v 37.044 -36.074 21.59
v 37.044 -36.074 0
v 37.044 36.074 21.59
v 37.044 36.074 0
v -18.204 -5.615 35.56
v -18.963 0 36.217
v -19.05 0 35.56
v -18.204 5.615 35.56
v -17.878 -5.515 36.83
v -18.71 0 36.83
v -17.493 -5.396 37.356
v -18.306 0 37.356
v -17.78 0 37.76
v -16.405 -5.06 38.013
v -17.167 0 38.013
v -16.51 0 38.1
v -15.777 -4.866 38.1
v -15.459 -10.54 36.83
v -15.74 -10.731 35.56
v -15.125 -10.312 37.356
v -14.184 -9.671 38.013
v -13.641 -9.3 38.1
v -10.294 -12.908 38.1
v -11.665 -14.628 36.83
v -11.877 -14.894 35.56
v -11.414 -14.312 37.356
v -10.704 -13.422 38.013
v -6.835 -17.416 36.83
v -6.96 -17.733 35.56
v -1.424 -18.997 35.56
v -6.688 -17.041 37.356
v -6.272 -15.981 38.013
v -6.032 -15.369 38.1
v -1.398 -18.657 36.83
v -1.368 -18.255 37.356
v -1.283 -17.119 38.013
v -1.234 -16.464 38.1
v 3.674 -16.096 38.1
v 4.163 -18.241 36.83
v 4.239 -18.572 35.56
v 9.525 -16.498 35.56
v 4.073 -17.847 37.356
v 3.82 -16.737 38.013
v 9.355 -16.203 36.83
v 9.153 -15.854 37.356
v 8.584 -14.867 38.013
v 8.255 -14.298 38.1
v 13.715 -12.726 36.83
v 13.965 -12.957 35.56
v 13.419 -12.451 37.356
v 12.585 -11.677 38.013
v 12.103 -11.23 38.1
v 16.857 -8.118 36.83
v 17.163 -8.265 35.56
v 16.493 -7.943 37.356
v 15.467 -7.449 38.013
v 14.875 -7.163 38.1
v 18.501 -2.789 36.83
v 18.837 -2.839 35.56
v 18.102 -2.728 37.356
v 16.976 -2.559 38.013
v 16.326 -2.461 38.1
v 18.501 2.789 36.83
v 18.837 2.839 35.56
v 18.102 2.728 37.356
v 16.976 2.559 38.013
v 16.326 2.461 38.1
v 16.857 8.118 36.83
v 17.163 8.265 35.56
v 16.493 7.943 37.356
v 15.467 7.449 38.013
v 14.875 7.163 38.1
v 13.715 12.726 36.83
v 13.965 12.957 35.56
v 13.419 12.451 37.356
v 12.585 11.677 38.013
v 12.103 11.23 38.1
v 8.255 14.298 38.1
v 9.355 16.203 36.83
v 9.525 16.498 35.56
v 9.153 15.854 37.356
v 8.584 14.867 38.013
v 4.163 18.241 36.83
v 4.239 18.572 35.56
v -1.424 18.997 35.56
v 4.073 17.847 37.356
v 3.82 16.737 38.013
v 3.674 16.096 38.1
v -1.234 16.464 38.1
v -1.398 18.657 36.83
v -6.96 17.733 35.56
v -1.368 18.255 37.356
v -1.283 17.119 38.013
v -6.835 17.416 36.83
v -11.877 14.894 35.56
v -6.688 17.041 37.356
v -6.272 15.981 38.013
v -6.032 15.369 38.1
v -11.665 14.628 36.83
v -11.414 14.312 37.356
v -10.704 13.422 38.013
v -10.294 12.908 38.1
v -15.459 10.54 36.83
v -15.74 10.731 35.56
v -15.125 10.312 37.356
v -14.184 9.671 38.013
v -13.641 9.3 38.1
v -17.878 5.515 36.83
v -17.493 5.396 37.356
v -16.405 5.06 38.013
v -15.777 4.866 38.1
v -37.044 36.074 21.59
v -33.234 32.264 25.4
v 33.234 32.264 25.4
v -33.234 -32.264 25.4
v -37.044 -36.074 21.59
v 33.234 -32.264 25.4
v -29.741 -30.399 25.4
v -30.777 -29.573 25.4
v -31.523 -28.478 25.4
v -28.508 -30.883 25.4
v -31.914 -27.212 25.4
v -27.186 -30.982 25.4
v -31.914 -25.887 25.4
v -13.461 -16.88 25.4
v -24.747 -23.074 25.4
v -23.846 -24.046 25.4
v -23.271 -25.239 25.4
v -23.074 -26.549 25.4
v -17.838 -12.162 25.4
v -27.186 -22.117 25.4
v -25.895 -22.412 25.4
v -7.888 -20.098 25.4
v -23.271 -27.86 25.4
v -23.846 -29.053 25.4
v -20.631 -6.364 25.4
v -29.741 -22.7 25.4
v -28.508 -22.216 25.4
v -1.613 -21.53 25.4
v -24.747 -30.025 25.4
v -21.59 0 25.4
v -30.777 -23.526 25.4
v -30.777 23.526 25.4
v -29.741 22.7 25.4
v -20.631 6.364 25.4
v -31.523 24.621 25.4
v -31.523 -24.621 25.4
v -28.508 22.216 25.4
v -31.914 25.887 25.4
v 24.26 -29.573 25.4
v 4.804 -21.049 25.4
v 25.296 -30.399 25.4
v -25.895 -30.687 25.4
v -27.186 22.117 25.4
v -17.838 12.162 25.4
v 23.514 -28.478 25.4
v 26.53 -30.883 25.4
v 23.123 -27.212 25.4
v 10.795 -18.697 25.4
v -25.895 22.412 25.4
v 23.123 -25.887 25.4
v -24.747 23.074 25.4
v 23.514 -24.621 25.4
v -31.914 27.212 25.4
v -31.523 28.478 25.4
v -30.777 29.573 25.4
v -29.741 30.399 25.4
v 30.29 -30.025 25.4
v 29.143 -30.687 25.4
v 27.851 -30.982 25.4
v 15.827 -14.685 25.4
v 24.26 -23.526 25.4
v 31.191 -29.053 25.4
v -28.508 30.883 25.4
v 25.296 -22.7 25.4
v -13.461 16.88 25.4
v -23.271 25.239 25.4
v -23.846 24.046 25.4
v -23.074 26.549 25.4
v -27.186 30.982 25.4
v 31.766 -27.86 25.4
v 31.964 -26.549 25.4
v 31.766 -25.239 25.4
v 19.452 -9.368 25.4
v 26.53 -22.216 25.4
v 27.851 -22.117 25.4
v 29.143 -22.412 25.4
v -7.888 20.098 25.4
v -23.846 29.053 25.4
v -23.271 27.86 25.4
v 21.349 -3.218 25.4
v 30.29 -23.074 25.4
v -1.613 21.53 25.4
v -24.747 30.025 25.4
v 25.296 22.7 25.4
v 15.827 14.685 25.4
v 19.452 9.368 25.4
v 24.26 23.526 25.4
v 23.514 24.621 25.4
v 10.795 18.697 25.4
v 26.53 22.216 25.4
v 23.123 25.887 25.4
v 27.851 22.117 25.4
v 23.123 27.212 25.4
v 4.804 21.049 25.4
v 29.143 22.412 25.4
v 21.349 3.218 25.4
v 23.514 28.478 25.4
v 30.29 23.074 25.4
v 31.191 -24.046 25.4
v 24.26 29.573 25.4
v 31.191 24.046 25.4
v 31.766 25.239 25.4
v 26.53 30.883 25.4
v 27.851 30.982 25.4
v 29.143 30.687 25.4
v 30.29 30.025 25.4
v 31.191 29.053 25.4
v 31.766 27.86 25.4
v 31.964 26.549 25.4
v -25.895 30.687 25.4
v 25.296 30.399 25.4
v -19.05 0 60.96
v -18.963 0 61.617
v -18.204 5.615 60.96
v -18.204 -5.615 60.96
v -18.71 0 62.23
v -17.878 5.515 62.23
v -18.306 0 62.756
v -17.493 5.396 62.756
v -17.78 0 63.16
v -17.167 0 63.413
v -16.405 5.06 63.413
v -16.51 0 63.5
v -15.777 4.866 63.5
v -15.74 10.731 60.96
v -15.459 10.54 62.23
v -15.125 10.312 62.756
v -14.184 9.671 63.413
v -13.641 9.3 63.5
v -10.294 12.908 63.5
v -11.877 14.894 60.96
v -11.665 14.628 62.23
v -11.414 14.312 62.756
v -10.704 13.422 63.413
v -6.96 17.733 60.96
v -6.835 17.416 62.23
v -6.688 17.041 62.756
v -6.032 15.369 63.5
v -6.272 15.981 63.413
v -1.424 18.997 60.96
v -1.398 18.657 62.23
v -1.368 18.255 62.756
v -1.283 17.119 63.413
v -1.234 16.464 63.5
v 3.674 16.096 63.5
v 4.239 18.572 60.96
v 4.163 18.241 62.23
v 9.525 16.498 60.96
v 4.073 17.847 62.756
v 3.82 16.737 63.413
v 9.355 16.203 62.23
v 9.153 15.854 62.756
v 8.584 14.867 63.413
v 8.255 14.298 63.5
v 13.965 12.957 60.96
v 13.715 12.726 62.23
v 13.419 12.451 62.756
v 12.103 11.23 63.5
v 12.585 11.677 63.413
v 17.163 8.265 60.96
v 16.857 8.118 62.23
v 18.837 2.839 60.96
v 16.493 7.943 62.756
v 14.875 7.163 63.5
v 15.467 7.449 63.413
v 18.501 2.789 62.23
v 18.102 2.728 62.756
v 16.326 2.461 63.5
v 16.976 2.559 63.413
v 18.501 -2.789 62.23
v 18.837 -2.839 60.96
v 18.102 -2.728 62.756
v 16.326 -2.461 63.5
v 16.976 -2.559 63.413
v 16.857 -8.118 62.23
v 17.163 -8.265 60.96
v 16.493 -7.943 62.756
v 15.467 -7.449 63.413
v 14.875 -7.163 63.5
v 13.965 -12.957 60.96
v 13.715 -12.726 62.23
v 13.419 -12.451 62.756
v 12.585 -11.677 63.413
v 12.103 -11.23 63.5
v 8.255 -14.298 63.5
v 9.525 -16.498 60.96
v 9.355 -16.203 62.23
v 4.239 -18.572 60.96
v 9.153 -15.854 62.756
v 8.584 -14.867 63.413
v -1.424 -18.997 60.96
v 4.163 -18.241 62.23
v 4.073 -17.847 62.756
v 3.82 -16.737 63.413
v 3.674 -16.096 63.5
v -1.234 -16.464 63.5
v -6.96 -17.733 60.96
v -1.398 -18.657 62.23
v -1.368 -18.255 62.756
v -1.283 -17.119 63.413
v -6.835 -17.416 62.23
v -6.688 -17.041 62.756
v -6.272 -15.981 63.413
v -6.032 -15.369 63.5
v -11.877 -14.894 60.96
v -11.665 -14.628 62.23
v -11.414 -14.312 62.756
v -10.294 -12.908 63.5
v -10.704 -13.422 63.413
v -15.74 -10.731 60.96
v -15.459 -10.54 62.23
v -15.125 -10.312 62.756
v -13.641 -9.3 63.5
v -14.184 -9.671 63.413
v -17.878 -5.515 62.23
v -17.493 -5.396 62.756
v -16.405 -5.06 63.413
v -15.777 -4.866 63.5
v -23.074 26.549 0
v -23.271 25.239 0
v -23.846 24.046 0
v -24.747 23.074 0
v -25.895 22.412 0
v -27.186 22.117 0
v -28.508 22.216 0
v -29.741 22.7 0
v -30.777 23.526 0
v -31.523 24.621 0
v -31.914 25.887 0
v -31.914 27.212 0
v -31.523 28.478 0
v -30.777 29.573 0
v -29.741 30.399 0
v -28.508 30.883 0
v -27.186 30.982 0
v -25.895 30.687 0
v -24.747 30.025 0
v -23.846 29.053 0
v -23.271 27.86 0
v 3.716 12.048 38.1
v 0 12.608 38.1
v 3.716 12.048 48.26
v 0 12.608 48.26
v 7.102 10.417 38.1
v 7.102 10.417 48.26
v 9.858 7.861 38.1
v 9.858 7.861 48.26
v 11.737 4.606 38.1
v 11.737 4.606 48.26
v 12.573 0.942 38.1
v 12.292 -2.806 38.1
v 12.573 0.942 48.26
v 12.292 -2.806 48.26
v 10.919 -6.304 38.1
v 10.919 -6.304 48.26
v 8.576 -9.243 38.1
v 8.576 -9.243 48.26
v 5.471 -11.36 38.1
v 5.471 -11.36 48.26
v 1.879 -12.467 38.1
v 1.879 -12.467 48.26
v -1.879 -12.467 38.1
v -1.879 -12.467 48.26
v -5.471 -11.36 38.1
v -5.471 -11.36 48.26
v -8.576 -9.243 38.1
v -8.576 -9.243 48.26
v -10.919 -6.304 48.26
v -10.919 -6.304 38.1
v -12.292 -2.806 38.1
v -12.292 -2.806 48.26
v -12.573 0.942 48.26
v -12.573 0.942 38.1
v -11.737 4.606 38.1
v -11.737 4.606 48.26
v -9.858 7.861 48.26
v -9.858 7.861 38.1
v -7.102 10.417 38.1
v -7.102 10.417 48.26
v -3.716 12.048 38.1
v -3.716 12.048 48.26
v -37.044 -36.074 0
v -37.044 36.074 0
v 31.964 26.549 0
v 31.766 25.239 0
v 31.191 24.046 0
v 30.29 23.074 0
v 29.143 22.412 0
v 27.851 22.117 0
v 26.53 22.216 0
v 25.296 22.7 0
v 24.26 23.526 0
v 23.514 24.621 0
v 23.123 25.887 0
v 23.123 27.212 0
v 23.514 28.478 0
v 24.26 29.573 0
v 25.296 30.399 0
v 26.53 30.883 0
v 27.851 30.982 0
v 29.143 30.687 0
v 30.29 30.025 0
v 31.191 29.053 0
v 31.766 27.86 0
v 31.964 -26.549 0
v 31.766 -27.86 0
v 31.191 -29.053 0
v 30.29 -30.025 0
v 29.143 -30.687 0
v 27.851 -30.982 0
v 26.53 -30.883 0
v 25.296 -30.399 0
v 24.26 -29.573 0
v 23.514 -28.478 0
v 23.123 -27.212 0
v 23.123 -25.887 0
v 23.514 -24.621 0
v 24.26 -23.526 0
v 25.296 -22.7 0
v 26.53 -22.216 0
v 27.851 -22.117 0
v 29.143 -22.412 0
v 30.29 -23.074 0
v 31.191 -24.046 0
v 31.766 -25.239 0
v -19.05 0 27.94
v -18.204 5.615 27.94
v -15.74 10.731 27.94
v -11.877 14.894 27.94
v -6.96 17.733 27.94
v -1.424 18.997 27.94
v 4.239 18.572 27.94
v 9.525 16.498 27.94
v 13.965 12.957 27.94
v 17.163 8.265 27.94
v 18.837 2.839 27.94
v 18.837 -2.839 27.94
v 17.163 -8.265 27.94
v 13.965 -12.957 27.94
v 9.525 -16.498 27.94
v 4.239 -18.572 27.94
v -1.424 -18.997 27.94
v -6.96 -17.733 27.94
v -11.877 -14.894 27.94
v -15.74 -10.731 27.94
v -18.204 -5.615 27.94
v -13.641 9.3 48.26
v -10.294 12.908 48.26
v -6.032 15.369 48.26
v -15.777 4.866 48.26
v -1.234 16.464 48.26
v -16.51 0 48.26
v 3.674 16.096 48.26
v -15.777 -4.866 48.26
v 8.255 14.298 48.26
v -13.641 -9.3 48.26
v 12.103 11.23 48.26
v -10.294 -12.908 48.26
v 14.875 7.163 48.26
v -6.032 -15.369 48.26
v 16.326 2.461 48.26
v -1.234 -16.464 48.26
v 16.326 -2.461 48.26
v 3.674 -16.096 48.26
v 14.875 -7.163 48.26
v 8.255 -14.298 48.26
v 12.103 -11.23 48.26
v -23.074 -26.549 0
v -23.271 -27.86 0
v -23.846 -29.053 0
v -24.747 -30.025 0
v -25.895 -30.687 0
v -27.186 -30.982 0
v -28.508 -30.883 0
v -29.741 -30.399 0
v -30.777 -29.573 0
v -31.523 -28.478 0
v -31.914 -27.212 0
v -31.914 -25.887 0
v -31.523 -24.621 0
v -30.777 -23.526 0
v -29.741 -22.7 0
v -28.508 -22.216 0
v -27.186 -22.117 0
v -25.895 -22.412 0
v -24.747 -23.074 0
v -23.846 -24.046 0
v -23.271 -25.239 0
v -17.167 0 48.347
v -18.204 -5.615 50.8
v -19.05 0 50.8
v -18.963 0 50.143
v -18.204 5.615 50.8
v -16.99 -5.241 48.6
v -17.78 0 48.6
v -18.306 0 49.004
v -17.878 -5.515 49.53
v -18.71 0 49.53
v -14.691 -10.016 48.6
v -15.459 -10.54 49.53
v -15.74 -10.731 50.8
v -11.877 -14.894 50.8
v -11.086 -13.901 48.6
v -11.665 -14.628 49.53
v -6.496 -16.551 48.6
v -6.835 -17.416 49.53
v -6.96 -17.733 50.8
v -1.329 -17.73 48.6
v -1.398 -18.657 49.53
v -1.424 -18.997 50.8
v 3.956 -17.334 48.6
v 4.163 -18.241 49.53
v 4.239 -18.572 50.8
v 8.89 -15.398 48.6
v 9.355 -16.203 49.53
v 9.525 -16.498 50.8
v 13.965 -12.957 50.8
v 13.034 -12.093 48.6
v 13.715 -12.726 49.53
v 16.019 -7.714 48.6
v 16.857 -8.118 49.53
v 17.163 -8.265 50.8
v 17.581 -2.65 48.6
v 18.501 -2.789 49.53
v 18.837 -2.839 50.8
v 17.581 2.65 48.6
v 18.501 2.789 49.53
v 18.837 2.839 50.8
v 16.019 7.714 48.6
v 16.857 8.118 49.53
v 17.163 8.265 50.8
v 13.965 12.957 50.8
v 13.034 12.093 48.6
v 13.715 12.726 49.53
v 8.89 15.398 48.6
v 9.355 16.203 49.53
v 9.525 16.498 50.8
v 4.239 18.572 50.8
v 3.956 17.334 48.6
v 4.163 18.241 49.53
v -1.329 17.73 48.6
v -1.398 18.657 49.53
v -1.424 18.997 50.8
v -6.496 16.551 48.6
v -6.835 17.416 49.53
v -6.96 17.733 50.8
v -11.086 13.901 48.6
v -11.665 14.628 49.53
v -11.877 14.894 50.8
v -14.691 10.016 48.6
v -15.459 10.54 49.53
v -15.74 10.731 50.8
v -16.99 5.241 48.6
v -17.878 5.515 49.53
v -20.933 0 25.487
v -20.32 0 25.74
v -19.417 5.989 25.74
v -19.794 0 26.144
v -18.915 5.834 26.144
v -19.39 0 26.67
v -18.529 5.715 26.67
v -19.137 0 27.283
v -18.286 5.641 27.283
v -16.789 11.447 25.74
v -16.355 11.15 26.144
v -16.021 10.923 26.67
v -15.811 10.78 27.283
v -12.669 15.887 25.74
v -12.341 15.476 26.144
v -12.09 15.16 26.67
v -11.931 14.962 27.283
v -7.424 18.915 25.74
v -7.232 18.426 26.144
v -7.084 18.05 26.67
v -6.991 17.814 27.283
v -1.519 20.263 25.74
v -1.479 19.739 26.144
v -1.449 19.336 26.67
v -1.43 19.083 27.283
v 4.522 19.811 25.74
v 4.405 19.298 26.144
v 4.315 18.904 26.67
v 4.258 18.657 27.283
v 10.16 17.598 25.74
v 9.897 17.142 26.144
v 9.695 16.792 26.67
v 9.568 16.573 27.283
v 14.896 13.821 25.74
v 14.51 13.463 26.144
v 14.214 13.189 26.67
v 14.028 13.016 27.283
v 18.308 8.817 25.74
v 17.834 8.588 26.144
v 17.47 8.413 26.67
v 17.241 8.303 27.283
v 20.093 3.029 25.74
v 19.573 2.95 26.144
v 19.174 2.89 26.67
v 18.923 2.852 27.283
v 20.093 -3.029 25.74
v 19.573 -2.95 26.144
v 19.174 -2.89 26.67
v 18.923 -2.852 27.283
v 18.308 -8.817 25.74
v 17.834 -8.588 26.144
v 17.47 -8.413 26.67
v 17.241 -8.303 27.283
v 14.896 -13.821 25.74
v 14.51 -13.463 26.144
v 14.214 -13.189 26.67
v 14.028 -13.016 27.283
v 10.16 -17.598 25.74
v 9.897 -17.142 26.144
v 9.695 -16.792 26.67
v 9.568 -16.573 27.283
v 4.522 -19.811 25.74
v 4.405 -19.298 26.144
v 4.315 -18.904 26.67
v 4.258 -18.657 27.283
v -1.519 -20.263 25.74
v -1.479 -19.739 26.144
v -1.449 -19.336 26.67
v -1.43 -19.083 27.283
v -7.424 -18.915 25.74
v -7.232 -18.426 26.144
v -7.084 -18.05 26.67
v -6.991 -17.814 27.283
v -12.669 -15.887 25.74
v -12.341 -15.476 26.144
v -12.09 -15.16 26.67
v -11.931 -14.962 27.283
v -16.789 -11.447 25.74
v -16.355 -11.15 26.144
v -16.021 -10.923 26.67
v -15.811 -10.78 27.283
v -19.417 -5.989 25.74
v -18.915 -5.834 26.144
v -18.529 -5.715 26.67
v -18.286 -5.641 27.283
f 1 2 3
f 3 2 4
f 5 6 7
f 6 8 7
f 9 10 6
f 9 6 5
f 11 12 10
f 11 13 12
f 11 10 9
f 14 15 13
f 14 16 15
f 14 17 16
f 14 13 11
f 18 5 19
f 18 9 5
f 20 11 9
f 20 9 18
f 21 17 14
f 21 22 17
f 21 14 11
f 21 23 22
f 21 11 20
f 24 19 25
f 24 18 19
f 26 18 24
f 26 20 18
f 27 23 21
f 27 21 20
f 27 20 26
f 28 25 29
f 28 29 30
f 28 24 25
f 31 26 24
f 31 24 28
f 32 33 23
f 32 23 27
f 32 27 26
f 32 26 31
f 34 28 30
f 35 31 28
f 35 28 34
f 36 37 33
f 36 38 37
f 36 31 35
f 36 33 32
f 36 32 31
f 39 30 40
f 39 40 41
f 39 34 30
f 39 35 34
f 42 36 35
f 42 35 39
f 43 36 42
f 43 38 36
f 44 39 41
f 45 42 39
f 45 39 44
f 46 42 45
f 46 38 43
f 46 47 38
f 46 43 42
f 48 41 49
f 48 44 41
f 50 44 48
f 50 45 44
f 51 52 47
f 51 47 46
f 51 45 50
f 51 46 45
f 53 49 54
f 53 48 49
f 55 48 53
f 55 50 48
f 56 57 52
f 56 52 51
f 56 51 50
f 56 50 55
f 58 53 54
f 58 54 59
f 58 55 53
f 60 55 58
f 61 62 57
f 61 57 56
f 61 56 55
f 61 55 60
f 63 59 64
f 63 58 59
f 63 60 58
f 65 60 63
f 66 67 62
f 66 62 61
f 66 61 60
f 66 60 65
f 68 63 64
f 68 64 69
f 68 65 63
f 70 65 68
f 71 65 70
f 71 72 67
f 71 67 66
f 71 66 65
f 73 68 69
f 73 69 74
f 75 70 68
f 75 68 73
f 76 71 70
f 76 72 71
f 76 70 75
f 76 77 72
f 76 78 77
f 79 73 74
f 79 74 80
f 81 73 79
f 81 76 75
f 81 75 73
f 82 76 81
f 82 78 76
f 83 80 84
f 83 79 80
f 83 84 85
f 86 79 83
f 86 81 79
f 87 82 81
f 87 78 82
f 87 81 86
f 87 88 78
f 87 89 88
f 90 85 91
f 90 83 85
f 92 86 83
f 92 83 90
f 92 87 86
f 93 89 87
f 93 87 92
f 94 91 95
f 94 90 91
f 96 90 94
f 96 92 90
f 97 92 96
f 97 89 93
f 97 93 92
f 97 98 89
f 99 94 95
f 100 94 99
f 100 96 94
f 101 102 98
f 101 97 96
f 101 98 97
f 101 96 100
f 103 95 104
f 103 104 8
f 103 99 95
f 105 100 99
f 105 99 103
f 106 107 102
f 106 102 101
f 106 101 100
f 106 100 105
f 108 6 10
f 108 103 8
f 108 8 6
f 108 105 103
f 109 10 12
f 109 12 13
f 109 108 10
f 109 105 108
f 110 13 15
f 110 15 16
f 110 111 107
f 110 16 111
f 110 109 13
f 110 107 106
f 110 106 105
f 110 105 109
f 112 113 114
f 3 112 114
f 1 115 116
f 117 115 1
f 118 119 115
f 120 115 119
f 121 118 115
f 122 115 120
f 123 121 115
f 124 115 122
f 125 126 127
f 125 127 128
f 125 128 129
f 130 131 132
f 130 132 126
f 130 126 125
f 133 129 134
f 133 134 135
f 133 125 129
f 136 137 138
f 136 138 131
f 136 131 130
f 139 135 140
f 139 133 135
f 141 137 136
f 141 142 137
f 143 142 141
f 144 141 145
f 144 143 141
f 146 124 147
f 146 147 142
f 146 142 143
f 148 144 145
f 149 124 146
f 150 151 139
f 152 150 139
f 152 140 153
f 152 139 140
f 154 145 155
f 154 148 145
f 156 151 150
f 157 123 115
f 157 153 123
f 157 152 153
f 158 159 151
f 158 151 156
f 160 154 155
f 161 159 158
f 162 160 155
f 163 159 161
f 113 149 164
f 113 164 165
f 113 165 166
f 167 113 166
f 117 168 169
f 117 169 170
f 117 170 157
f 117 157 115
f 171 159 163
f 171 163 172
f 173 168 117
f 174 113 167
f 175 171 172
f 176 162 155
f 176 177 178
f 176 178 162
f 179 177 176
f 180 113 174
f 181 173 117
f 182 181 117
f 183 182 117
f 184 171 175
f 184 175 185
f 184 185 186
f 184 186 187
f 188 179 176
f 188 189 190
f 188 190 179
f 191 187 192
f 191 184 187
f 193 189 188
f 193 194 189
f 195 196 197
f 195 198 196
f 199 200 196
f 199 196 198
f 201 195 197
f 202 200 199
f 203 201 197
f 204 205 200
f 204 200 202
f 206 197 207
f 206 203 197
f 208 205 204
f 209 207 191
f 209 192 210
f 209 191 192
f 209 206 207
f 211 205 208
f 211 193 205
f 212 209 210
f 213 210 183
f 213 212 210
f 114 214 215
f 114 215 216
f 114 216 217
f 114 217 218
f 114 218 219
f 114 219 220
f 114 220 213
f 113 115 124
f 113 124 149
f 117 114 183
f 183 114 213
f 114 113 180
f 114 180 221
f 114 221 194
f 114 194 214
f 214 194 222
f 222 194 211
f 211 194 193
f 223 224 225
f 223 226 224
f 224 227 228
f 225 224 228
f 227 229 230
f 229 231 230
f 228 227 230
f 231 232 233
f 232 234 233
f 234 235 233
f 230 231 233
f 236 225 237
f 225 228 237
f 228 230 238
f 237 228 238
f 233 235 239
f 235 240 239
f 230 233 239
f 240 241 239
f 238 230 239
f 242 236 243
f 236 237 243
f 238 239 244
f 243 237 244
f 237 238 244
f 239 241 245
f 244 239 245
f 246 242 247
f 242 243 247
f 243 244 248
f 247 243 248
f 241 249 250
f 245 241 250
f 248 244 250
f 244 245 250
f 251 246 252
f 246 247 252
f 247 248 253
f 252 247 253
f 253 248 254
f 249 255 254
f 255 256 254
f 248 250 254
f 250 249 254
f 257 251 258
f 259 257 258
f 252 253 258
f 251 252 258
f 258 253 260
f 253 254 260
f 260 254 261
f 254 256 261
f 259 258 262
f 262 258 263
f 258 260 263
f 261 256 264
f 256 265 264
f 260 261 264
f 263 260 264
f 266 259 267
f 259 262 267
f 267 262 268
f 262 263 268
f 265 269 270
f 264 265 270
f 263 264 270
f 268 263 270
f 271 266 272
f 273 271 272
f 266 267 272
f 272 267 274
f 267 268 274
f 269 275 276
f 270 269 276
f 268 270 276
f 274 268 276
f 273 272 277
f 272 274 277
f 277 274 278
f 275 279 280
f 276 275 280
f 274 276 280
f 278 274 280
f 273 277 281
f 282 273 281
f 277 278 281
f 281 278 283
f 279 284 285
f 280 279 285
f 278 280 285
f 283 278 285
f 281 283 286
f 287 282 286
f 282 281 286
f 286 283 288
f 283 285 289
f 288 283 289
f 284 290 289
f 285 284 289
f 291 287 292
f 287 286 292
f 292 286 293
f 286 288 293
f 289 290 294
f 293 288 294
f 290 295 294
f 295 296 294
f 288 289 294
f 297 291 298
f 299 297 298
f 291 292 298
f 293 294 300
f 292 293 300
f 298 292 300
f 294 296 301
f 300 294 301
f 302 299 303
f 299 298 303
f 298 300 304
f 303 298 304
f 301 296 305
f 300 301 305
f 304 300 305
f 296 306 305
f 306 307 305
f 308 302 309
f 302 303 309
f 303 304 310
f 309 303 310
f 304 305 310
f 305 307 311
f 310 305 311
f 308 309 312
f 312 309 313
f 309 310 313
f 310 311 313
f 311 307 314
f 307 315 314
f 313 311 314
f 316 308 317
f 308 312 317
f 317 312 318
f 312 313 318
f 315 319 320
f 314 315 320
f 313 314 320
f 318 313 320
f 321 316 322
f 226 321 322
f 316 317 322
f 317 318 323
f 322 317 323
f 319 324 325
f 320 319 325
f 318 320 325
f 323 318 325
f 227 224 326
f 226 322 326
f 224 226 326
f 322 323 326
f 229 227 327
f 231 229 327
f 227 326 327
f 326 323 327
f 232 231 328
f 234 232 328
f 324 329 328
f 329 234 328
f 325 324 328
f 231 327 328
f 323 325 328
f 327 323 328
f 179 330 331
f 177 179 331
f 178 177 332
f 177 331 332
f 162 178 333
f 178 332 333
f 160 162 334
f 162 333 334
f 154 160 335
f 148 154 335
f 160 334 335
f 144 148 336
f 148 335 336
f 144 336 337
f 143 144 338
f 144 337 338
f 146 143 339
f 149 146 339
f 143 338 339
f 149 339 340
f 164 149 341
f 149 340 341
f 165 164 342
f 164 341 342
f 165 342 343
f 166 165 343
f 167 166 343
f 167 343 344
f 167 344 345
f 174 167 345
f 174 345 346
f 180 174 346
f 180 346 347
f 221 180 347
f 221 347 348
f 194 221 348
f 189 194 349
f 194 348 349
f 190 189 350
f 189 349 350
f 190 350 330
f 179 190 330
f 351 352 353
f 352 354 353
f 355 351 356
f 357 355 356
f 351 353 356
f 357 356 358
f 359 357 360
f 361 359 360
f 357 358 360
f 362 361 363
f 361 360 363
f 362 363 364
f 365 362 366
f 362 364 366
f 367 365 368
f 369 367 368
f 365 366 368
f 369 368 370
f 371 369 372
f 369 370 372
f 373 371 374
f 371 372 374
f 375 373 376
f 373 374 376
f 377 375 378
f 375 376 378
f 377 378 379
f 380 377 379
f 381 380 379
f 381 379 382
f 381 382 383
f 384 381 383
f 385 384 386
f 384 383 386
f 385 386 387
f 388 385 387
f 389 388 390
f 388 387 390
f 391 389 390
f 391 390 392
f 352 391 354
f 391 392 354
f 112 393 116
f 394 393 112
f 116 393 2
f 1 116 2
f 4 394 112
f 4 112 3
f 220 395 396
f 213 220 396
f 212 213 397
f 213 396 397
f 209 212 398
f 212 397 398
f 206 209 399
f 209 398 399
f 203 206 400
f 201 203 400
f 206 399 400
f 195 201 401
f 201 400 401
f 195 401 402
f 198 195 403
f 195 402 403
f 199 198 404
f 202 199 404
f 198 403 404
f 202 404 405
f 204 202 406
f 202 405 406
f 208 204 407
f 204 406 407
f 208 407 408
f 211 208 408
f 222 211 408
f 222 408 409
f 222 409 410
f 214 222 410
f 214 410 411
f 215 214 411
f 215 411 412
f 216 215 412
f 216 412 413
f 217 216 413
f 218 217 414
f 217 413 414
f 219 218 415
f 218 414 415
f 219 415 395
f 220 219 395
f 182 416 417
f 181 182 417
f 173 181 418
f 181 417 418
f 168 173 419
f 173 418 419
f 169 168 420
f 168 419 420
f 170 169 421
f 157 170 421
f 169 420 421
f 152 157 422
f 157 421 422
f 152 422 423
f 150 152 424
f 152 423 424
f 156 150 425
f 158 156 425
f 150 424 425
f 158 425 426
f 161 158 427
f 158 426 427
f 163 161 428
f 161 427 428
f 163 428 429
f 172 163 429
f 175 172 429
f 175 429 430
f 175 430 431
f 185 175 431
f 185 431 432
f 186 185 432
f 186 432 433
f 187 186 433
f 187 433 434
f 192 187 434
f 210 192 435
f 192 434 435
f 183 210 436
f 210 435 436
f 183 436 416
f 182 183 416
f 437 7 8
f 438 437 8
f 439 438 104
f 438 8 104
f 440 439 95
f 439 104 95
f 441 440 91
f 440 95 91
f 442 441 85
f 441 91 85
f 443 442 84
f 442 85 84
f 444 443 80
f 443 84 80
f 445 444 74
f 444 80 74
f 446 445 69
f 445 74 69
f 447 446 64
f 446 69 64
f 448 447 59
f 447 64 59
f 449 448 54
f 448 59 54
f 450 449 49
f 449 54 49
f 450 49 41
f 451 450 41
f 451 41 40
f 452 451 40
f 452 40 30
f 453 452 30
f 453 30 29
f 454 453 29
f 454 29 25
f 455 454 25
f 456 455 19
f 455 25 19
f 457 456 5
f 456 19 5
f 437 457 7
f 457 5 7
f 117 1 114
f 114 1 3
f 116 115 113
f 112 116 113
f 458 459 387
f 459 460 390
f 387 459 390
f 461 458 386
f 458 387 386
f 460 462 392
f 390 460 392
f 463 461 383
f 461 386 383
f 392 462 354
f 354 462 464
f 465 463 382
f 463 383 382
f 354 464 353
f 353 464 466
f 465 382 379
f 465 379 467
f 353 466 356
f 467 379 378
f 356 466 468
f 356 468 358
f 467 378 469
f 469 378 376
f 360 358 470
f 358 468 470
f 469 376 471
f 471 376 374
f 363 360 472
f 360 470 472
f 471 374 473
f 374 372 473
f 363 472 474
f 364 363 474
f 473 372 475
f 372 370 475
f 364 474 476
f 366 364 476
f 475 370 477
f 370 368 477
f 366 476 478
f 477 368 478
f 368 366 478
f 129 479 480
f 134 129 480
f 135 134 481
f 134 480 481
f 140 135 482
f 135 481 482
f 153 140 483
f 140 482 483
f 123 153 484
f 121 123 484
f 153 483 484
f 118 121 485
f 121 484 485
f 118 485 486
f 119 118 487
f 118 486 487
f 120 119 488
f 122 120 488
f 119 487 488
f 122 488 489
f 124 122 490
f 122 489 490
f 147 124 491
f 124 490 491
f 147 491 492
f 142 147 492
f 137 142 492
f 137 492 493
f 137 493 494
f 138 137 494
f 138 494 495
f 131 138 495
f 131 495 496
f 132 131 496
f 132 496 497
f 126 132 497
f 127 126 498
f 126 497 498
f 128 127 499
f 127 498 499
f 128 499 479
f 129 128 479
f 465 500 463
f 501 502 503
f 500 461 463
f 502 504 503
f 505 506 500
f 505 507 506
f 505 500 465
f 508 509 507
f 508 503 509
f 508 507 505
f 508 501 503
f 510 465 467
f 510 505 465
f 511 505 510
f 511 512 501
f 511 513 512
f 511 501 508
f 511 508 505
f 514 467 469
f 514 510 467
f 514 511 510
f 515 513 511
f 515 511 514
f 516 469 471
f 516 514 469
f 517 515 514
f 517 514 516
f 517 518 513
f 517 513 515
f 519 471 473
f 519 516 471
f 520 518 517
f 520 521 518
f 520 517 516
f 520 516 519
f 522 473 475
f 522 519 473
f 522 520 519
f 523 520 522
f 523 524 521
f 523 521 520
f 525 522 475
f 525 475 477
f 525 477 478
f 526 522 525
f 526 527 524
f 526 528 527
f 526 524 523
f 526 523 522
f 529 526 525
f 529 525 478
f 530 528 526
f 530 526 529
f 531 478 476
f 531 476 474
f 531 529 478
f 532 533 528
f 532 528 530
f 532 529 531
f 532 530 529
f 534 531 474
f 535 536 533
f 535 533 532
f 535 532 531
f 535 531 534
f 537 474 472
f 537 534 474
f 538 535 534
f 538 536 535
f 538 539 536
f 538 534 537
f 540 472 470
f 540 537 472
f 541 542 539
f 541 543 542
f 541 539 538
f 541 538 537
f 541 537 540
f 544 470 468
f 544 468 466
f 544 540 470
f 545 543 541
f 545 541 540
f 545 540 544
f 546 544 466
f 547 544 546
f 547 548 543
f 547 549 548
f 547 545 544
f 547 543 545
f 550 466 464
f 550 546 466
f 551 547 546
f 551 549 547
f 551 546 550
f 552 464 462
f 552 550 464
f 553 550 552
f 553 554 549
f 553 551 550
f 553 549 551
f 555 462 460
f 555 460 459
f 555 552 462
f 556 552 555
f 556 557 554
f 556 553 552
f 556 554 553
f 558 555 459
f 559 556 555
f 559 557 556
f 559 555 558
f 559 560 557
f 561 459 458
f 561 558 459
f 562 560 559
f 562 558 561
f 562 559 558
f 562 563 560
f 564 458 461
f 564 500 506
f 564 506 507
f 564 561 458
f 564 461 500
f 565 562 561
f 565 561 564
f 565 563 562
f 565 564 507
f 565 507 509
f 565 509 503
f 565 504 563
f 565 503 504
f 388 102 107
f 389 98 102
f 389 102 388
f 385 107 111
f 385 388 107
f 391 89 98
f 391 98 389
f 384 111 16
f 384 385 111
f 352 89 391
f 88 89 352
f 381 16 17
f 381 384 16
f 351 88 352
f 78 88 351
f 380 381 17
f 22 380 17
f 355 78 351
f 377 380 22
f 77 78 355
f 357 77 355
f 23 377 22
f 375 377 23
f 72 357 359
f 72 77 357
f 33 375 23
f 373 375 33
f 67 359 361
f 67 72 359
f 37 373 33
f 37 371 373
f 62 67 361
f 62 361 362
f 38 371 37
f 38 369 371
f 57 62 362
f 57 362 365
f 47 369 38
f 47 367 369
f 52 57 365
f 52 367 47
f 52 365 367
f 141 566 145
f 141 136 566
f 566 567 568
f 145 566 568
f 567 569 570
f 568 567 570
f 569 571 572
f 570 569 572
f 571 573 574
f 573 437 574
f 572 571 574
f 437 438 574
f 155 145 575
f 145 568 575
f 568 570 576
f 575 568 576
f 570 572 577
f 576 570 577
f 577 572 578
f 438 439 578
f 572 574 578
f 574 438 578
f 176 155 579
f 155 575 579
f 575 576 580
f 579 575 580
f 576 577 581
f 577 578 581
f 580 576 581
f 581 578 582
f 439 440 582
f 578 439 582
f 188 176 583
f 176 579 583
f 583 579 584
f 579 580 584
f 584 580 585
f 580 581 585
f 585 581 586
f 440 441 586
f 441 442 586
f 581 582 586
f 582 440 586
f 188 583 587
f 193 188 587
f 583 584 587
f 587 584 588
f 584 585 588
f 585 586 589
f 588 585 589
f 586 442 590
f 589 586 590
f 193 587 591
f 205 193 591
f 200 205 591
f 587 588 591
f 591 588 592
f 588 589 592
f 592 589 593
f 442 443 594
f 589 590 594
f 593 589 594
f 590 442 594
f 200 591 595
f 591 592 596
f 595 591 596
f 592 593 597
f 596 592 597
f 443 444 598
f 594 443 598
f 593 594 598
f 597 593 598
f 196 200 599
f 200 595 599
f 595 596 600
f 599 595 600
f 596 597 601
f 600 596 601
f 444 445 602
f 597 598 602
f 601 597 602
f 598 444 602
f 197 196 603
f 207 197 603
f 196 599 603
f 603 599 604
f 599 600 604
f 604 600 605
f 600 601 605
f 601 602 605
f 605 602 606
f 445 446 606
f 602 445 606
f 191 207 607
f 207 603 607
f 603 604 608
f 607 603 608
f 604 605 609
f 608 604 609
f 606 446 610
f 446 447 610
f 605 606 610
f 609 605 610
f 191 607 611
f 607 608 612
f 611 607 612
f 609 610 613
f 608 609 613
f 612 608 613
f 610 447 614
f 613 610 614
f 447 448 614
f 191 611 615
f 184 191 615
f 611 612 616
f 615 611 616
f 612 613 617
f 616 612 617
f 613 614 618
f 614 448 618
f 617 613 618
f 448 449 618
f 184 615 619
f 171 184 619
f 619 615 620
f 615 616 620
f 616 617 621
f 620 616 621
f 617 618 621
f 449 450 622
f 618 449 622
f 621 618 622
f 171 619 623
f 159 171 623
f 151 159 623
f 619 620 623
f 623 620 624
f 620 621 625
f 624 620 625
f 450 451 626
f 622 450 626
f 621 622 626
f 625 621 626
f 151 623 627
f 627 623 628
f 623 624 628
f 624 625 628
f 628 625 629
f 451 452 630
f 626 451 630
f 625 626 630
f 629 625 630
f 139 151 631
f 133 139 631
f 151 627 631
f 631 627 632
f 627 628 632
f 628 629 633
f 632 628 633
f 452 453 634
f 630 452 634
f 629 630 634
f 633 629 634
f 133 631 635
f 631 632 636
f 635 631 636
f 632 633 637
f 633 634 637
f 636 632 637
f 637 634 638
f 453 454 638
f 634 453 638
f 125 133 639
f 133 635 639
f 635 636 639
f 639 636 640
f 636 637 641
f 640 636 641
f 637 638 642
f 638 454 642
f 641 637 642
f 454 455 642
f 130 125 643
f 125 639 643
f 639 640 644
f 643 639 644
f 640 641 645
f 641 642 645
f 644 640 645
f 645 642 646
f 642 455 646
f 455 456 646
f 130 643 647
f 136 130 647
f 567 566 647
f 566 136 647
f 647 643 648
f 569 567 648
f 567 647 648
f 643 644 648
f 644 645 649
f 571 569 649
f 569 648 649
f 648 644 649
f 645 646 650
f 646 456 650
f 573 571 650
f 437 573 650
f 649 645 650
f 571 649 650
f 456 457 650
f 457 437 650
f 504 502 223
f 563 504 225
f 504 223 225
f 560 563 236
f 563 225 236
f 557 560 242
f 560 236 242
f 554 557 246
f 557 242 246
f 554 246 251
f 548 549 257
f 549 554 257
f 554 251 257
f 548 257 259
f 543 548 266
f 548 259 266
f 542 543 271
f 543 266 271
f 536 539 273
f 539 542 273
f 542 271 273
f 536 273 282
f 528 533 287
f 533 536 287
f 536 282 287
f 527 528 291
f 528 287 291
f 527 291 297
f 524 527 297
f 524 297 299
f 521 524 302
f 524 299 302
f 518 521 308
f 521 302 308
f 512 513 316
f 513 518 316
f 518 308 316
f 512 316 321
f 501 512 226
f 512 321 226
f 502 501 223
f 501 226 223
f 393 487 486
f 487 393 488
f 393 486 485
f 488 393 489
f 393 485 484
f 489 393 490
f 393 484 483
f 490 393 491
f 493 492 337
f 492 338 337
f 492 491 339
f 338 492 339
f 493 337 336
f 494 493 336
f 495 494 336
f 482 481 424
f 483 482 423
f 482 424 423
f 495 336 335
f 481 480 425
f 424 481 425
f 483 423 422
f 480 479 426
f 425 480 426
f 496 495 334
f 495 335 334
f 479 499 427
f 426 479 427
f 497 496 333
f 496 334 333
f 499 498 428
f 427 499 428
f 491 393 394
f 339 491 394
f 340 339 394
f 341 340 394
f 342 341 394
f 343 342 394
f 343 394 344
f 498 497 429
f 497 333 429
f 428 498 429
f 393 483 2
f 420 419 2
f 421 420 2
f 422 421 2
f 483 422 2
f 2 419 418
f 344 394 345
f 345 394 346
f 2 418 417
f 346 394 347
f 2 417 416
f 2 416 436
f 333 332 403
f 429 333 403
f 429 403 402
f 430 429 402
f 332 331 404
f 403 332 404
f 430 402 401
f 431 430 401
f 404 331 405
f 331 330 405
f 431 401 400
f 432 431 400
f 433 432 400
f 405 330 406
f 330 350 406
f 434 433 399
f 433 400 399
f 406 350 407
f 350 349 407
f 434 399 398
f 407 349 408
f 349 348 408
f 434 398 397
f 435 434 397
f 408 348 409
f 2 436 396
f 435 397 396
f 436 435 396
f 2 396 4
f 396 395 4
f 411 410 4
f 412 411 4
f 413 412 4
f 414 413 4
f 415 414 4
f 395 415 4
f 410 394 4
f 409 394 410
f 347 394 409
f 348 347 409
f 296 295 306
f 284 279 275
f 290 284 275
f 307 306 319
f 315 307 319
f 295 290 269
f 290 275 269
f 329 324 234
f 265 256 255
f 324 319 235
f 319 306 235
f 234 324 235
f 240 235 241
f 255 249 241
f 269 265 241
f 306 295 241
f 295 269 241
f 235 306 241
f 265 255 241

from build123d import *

# Parameters (mm, degrees)
F0_W     = 74.0873217583
F0_H     = 72.1489936113
F1_DEPTH = 25.4
F2_R     = 4.445
F3_DEPTH = 25.4
F4_W     = 19.05
F4_H     = 38.1
F6_W     = 10.4351935416
F6_H     = 10.16
F8_SIZE  = 3.81
F9_R     = 2.54
F10_R    = 2.54


with BuildPart() as f1:
    # F0 (on Top) → F1 (new body)
    with BuildSketch(Plane.XY):
        Rectangle(F0_W, F0_H)
    extrude(amount=F1_DEPTH)

    # F2 (on face) → F3 (cut)
    with BuildSketch(Plane(origin=(0, 0, 0), x_dir=(1, 0, 0), z_dir=(0, 0, -1))):
        with Locations((27.5186608791, -26.5494968057)):
            Circle(F2_R)
        with Locations((27.5186608791, 26.5494968057)):
            Circle(F2_R)
        with Locations((-27.5186608791, 26.5494968057)):
            Circle(F2_R)
        with Locations((-27.5186608791, -26.5494968057)):
            Circle(F2_R)
    extrude(amount=-F3_DEPTH, mode=Mode.SUBTRACT)

    # F4 (on Front) → F5 (revolve)
    with BuildSketch(Plane.XZ):
        with Locations((-9.525, 44.45)):
            Rectangle(F4_W, F4_H)
    revolve(axis=Axis((0, 0, 44.45), (0, 0, -1)))

    # F6 (on Right) → F7 (revolve, cut)
    with BuildSketch(Plane.YZ):
        with Locations((17.8258673744, 43.18)):
            Rectangle(F6_W, F6_H)
    revolve(axis=Axis((0, 0, 63.5), (0, 0, -1)), mode=Mode.SUBTRACT)

    # F8
    f8_edges = [f1.edges().sort_by_distance(p)[0] for p in [
        (-37.043661, 0, 25.4),
        (0, -36.074497, 25.4),
        (37.043661, 0, 25.4),
        (0, 36.074497, 25.4),
    ]]
    chamfer(f8_edges, length=F8_SIZE)

    # F9
    f9_edges = [f1.edges().sort_by_distance(p)[0] for p in [
        (19.05, 0, 38.1),
        (19.05, 0, 48.26),
        (19.05, 0, 25.4),
    ]]
    fillet(f9_edges, radius=F9_R)

    # F10
    f10_edges = [f1.edges().sort_by_distance(p)[0] for p in [
        (19.05, 0, 63.5),
    ]]
    fillet(f10_edges, radius=F10_R)


solid = f1.part
